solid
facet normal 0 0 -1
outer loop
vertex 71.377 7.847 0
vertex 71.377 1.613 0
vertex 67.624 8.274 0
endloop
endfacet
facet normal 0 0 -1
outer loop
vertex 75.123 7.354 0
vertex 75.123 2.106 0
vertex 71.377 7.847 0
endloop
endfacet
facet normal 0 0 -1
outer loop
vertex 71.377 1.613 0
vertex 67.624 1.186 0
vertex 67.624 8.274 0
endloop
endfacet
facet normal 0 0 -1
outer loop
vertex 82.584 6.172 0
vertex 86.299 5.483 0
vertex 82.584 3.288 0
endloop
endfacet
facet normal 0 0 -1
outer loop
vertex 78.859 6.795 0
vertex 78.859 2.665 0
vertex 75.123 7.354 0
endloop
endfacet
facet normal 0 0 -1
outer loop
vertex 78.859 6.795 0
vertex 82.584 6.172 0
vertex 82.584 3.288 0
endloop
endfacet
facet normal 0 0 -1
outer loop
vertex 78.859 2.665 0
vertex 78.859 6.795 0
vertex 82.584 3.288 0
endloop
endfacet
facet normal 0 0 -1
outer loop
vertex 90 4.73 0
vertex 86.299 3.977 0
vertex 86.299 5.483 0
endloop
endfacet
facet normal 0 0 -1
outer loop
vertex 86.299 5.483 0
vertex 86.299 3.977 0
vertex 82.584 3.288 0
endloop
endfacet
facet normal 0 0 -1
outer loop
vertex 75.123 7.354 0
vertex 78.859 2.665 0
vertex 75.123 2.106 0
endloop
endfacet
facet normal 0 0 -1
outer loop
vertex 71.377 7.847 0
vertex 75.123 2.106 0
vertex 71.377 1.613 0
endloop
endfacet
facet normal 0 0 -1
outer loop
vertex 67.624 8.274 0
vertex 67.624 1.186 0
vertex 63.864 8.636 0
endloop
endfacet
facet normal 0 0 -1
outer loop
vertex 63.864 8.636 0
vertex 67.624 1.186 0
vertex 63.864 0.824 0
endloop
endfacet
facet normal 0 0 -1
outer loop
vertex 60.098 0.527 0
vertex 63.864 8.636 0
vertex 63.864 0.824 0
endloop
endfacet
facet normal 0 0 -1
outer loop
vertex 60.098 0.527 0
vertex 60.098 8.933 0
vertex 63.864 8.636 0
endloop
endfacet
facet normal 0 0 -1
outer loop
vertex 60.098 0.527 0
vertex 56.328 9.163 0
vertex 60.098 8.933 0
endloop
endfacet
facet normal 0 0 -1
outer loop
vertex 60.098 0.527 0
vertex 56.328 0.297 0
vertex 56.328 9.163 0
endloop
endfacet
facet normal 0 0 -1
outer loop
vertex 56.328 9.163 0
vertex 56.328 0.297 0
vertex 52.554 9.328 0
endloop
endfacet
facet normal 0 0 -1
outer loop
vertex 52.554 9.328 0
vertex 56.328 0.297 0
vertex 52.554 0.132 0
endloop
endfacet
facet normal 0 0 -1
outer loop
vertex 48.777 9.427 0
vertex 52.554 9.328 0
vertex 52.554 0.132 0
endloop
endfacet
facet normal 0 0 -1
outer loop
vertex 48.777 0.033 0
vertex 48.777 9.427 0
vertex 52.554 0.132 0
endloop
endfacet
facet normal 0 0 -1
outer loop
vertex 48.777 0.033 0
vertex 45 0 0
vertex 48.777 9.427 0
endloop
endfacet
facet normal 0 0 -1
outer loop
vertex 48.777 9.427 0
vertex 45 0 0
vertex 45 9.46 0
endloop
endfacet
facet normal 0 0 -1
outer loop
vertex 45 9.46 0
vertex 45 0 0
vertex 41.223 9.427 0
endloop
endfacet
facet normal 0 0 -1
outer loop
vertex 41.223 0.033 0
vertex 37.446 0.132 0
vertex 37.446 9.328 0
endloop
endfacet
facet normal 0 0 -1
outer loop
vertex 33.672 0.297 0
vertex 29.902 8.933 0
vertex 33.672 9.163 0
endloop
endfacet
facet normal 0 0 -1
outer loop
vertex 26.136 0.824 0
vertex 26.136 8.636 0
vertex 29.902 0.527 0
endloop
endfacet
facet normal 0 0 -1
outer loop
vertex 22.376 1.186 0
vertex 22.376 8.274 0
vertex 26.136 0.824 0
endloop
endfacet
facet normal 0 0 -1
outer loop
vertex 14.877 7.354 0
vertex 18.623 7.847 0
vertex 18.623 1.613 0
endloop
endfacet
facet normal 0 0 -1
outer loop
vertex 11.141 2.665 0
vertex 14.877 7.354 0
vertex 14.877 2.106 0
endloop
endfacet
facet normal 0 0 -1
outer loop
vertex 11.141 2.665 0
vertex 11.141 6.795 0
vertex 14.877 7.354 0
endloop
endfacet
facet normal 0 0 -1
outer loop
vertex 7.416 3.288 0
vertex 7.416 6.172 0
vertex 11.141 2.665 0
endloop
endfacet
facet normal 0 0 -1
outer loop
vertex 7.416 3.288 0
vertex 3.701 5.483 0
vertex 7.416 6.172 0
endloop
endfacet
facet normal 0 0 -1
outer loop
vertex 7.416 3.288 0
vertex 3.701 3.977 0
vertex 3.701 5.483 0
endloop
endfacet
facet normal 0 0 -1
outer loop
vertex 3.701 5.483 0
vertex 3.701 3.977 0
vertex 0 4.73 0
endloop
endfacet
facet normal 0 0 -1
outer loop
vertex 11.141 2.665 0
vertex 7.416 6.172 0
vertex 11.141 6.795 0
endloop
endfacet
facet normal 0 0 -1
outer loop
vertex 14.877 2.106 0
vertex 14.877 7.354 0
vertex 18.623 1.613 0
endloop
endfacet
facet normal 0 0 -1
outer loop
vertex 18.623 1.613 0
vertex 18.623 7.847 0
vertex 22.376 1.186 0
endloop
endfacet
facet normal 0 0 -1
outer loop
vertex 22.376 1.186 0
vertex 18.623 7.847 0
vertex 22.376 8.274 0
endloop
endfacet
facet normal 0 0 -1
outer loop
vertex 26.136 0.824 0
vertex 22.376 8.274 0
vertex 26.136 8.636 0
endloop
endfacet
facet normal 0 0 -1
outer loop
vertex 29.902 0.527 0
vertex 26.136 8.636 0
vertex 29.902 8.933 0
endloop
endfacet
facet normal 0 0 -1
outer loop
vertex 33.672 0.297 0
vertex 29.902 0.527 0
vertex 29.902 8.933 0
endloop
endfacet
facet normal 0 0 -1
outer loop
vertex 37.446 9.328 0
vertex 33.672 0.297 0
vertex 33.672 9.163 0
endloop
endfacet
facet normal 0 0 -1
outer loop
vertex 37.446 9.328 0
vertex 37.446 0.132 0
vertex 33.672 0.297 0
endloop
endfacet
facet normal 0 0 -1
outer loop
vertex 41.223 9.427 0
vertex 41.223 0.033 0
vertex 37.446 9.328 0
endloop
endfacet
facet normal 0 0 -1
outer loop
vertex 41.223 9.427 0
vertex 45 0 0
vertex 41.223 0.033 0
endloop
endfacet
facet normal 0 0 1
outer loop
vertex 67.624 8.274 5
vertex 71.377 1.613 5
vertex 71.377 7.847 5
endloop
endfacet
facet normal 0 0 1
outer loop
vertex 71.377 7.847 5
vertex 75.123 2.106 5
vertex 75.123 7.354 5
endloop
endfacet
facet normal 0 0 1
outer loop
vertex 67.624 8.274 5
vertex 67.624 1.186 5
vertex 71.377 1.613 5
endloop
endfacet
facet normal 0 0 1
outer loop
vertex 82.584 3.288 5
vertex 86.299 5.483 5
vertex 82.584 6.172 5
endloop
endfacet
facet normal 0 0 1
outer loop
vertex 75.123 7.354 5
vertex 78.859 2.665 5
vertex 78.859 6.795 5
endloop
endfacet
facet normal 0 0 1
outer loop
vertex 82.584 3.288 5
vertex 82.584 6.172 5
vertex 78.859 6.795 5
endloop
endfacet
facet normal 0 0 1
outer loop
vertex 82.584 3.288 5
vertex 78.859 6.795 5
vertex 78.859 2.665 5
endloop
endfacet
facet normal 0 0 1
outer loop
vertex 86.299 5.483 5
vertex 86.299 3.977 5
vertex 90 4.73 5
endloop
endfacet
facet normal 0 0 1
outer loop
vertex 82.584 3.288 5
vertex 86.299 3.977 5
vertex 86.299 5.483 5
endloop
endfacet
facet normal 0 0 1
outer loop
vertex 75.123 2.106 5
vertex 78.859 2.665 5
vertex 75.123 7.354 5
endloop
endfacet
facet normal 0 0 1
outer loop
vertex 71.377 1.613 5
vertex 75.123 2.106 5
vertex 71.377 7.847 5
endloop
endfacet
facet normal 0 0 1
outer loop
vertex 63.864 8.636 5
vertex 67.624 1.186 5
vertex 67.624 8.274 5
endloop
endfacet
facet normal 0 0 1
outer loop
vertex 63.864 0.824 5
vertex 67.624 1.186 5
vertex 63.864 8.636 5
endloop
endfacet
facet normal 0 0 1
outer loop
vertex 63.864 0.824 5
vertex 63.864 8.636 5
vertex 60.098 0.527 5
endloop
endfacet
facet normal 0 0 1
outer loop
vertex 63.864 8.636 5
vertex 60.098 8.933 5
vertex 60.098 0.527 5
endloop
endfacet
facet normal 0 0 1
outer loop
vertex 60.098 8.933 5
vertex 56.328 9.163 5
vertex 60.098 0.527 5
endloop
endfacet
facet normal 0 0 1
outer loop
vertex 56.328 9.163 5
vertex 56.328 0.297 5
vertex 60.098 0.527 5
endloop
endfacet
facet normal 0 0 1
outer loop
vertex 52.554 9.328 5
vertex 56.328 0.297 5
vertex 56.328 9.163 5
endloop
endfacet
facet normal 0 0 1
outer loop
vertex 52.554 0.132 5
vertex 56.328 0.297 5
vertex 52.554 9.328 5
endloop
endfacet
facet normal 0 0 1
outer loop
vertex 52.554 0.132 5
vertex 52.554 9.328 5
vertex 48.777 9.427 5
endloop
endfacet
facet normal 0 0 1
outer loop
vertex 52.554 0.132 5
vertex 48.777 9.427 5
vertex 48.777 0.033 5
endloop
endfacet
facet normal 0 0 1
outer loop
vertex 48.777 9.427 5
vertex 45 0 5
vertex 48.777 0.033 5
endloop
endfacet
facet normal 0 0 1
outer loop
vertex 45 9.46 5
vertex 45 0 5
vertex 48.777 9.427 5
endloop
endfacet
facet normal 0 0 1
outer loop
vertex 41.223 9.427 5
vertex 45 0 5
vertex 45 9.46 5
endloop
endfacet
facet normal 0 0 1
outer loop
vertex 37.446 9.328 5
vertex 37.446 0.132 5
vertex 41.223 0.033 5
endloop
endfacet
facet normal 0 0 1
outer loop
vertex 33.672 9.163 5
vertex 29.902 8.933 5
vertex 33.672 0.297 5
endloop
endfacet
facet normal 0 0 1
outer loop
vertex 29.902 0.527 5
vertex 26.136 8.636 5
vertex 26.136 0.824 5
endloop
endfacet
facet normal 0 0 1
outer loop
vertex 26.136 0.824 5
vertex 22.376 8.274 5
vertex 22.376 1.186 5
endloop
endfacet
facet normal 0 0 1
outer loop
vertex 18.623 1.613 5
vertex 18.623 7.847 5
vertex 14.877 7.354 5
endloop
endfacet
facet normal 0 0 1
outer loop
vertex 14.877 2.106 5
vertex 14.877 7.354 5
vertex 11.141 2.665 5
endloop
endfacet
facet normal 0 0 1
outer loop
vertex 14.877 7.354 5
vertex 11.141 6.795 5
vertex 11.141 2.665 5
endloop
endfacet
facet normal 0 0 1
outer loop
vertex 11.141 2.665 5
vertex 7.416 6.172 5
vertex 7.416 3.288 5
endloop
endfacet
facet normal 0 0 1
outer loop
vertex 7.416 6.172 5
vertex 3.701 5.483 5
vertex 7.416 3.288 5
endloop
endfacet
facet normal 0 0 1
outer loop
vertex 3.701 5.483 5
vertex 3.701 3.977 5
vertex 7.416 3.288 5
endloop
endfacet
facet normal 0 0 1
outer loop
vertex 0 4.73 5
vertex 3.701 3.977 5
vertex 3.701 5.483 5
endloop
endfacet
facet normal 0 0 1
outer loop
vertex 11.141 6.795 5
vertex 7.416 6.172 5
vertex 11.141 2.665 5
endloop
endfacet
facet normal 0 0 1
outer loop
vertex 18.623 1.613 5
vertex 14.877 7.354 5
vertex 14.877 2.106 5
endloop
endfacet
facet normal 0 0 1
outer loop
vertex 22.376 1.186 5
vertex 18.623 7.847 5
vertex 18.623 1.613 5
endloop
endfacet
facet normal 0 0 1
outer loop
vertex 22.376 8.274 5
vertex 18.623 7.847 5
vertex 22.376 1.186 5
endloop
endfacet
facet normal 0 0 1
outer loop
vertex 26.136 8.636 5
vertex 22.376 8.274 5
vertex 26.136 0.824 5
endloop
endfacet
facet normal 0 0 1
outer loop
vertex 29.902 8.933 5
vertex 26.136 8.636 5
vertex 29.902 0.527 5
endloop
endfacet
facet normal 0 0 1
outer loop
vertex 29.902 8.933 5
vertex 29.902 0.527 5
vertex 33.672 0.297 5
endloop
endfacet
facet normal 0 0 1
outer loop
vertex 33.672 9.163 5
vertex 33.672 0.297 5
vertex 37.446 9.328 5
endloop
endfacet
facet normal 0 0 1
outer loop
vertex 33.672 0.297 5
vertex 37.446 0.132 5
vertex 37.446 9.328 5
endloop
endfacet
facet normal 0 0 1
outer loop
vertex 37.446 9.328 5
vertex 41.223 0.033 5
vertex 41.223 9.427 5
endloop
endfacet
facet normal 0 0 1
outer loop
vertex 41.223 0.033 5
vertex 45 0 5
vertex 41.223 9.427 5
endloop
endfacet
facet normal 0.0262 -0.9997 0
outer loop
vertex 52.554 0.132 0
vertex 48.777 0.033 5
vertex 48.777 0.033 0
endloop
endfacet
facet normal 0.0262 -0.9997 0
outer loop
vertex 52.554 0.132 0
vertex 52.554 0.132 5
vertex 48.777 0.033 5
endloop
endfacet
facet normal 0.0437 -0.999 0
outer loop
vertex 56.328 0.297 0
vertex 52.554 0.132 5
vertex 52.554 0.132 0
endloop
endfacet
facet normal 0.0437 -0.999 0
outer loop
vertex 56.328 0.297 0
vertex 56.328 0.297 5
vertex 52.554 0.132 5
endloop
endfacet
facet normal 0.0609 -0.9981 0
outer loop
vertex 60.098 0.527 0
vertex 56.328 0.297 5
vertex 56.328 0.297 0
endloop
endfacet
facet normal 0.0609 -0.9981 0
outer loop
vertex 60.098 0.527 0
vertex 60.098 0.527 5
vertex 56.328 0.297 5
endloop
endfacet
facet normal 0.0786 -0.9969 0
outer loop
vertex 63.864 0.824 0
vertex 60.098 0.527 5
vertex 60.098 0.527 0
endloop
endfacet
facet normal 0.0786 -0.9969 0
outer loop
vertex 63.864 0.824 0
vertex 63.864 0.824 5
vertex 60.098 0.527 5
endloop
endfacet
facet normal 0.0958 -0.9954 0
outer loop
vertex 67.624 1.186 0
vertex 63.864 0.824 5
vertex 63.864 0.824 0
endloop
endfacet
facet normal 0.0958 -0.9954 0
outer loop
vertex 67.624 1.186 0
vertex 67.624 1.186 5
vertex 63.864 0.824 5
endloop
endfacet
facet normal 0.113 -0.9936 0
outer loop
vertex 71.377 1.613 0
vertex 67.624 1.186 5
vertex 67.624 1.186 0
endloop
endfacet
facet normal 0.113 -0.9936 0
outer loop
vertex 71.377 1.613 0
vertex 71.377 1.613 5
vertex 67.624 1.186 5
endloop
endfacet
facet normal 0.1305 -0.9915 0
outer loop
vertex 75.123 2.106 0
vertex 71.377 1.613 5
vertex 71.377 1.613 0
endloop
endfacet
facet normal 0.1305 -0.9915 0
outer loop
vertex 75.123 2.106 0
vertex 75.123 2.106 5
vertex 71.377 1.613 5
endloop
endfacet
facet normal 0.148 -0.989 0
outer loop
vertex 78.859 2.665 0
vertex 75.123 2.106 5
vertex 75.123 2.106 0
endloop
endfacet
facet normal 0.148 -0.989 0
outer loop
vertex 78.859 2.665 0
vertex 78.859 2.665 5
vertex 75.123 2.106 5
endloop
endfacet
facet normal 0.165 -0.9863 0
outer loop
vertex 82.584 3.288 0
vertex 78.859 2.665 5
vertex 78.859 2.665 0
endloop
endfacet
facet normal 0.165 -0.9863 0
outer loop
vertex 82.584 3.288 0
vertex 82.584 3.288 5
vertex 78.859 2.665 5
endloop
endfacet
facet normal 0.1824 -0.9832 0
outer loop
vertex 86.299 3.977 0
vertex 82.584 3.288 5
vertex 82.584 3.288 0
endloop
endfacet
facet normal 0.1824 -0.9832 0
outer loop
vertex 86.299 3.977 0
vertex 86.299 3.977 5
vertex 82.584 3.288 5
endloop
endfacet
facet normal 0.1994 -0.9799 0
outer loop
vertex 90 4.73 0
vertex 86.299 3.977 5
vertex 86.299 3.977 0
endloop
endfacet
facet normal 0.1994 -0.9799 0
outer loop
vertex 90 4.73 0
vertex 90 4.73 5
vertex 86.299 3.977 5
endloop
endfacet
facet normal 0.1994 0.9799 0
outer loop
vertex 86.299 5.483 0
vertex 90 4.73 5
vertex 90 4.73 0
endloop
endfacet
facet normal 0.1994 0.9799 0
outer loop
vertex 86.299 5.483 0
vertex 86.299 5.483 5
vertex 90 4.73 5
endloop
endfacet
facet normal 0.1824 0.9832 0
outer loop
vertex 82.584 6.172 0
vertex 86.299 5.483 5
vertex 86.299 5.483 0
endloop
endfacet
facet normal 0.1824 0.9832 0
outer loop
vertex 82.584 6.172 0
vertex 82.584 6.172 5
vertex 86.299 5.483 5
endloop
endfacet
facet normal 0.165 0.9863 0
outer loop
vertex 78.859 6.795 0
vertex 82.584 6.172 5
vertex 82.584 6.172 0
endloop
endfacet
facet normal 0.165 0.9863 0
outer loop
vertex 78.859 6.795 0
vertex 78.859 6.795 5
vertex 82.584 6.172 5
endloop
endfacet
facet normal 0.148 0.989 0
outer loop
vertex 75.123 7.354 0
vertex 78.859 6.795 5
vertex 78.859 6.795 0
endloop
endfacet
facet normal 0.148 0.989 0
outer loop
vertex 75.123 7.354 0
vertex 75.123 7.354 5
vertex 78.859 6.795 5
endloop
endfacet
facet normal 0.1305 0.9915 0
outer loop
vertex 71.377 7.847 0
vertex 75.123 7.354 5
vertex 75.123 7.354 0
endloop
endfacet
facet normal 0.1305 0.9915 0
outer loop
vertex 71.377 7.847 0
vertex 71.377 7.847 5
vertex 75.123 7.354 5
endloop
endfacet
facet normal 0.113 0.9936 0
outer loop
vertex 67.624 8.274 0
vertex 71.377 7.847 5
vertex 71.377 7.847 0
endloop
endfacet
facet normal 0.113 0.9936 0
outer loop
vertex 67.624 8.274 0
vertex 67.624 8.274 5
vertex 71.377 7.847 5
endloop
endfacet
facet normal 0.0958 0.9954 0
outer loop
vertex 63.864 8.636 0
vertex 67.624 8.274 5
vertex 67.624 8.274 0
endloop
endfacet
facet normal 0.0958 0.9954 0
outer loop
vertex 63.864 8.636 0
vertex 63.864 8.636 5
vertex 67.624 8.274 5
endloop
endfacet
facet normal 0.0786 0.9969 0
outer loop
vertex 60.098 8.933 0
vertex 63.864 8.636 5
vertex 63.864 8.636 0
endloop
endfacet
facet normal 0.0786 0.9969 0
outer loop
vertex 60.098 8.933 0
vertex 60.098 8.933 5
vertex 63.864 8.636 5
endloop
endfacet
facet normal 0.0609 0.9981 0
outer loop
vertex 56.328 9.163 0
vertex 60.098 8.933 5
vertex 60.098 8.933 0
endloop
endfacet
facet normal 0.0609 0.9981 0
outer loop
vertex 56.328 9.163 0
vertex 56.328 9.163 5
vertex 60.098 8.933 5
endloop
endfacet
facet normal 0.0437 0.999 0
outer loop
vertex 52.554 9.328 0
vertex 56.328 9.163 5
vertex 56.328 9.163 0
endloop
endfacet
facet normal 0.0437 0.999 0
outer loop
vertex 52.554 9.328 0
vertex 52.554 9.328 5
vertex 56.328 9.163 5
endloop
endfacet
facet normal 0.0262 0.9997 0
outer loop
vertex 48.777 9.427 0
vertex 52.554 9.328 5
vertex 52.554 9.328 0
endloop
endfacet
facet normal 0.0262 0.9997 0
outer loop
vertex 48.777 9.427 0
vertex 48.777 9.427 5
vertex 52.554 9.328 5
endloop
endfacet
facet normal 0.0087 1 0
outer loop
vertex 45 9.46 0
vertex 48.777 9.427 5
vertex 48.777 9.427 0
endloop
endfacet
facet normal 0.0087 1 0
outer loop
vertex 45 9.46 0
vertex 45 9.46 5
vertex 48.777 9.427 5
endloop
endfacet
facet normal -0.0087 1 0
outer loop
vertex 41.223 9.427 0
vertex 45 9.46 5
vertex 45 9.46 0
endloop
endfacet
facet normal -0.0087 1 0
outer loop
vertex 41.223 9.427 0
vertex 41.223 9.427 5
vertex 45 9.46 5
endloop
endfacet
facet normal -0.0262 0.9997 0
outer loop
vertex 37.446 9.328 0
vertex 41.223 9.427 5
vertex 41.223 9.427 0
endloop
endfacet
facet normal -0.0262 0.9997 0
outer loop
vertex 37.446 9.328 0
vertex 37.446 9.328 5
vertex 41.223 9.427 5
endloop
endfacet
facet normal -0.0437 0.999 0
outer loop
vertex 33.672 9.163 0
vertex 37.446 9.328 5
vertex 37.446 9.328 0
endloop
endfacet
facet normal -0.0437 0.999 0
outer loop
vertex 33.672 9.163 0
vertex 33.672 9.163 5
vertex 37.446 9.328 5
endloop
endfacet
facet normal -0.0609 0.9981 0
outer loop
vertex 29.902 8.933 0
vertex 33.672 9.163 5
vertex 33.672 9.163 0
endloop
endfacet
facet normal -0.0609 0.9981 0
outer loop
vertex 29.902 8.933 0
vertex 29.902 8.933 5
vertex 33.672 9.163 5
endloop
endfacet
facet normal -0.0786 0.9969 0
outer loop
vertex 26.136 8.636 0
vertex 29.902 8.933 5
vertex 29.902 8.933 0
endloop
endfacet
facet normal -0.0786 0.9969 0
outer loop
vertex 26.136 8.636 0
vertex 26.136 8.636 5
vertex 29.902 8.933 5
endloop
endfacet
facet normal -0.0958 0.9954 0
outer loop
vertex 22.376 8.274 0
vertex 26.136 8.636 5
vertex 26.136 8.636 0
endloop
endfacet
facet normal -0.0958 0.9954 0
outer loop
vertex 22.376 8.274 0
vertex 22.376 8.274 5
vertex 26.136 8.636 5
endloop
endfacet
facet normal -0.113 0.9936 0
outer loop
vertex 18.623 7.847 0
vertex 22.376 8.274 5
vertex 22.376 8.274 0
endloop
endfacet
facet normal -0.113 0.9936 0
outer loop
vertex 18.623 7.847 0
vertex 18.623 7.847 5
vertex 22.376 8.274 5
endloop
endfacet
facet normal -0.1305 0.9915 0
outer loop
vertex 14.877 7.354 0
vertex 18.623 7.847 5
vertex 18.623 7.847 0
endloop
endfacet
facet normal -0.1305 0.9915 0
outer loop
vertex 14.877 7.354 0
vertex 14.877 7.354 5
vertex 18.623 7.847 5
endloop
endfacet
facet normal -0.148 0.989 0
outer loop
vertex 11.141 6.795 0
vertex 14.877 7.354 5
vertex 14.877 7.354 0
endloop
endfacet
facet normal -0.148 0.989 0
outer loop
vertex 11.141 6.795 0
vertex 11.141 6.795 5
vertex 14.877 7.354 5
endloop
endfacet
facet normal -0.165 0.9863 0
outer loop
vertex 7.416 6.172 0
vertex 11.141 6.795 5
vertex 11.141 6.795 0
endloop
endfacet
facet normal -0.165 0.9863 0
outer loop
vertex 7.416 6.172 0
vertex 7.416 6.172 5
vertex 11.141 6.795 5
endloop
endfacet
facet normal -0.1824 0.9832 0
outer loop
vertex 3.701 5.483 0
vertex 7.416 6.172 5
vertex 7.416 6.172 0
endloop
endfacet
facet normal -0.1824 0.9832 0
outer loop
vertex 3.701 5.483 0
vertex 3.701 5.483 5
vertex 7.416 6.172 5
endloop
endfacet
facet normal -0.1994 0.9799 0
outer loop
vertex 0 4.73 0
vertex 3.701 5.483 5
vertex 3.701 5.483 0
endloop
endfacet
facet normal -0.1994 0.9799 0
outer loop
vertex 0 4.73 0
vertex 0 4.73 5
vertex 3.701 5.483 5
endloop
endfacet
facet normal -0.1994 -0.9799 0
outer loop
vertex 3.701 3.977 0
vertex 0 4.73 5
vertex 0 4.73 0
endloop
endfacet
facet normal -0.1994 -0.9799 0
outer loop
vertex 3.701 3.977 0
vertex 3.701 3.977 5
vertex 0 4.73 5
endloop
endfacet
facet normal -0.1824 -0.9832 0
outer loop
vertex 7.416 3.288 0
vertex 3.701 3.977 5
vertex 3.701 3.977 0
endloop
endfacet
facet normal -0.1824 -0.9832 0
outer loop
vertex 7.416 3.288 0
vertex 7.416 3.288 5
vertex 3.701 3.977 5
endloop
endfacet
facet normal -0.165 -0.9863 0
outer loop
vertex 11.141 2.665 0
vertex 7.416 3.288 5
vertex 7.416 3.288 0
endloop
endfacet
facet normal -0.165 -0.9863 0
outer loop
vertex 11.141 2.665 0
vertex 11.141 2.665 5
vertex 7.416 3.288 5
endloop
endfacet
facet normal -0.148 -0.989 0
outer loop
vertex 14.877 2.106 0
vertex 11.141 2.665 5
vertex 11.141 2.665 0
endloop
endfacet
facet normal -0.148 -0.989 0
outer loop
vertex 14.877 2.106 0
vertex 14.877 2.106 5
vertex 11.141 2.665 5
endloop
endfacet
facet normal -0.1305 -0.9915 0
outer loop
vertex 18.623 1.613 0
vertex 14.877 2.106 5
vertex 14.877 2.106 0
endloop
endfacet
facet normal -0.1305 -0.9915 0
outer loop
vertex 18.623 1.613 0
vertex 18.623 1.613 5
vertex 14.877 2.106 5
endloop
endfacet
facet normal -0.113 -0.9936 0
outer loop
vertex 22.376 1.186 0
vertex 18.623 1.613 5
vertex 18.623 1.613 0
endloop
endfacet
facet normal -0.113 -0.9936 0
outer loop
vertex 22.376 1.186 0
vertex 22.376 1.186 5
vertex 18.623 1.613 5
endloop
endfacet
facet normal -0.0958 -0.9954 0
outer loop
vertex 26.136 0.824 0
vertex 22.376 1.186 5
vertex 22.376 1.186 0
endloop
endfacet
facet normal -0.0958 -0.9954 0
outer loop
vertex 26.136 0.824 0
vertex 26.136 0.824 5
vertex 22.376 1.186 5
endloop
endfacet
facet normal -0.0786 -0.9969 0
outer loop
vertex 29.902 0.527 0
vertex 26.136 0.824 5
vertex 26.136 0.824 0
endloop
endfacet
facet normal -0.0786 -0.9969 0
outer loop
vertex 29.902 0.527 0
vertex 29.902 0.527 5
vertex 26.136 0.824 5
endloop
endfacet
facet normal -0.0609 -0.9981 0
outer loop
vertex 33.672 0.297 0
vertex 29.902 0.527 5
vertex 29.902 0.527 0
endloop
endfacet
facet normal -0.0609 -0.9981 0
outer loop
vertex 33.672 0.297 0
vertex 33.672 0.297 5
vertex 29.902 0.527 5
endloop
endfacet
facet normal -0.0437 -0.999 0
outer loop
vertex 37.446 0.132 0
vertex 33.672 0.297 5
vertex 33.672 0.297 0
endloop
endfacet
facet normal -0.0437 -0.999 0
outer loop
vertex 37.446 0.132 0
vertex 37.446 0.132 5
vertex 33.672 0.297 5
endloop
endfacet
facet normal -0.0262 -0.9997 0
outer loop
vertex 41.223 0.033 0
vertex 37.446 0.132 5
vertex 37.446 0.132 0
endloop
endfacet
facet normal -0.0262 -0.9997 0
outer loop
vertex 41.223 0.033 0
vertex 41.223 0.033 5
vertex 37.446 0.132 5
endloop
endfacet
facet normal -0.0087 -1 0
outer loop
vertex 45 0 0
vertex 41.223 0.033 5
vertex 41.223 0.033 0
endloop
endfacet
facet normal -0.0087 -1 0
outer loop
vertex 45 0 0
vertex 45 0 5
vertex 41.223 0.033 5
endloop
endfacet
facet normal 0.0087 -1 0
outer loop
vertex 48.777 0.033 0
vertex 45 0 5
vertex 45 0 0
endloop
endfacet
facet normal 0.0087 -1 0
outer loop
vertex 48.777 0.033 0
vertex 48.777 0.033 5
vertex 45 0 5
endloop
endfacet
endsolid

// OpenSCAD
$fn = 32;

// ----------------------------------------------------------------------
// Arc profile plate: lens, 48 points
// ----------------------------------------------------------------------

// --- parameters (mm) ---
lens_chord = 90;          // chord length of the lens, X
arc_r = 216.44;           // radius of both arcs
arc_angle = 24;           // angle of each arc, degrees
sagitta = 4.73;           // bulge of each arc (half the lens height)
arc_step = 1;             // sampling step of the arcs, degrees
plate_t = 5;              // plate thickness, Z

bbox_y = 2 * sagitta;  // full lens height

profile = [[90, 4.73], [86.299, 5.483], [82.584, 6.172], [78.859, 6.795], [75.123, 7.354], [71.377, 7.847], [67.624, 8.274], [63.864, 8.636], [60.098, 8.933], [56.328, 9.163], [52.554, 9.328], [48.777, 9.427], [45, 9.46], [41.223, 9.427], [37.446, 9.328], [33.672, 9.163], [29.902, 8.933], [26.136, 8.636], [22.376, 8.274], [18.623, 7.847], [14.877, 7.354], [11.141, 6.795], [7.416, 6.172], [3.701, 5.483], [0, 4.73], [3.701, 3.977], [7.416, 3.288], [11.141, 2.665], [14.877, 2.106], [18.623, 1.613], [22.376, 1.186], [26.136, 0.824], [29.902, 0.527], [33.672, 0.297], [37.446, 0.132], [41.223, 0.033], [45, 0], [48.777, 0.033], [52.554, 0.132], [56.328, 0.297], [60.098, 0.527], [63.864, 0.824], [67.624, 1.186], [71.377, 1.613], [75.123, 2.106], [78.859, 2.665], [82.584, 3.288], [86.299, 3.977]];  // primary outline, 48 points, counter clockwise

// --- the one profile operation ---
linear_extrude(height = plate_t) polygon(points = profile);
